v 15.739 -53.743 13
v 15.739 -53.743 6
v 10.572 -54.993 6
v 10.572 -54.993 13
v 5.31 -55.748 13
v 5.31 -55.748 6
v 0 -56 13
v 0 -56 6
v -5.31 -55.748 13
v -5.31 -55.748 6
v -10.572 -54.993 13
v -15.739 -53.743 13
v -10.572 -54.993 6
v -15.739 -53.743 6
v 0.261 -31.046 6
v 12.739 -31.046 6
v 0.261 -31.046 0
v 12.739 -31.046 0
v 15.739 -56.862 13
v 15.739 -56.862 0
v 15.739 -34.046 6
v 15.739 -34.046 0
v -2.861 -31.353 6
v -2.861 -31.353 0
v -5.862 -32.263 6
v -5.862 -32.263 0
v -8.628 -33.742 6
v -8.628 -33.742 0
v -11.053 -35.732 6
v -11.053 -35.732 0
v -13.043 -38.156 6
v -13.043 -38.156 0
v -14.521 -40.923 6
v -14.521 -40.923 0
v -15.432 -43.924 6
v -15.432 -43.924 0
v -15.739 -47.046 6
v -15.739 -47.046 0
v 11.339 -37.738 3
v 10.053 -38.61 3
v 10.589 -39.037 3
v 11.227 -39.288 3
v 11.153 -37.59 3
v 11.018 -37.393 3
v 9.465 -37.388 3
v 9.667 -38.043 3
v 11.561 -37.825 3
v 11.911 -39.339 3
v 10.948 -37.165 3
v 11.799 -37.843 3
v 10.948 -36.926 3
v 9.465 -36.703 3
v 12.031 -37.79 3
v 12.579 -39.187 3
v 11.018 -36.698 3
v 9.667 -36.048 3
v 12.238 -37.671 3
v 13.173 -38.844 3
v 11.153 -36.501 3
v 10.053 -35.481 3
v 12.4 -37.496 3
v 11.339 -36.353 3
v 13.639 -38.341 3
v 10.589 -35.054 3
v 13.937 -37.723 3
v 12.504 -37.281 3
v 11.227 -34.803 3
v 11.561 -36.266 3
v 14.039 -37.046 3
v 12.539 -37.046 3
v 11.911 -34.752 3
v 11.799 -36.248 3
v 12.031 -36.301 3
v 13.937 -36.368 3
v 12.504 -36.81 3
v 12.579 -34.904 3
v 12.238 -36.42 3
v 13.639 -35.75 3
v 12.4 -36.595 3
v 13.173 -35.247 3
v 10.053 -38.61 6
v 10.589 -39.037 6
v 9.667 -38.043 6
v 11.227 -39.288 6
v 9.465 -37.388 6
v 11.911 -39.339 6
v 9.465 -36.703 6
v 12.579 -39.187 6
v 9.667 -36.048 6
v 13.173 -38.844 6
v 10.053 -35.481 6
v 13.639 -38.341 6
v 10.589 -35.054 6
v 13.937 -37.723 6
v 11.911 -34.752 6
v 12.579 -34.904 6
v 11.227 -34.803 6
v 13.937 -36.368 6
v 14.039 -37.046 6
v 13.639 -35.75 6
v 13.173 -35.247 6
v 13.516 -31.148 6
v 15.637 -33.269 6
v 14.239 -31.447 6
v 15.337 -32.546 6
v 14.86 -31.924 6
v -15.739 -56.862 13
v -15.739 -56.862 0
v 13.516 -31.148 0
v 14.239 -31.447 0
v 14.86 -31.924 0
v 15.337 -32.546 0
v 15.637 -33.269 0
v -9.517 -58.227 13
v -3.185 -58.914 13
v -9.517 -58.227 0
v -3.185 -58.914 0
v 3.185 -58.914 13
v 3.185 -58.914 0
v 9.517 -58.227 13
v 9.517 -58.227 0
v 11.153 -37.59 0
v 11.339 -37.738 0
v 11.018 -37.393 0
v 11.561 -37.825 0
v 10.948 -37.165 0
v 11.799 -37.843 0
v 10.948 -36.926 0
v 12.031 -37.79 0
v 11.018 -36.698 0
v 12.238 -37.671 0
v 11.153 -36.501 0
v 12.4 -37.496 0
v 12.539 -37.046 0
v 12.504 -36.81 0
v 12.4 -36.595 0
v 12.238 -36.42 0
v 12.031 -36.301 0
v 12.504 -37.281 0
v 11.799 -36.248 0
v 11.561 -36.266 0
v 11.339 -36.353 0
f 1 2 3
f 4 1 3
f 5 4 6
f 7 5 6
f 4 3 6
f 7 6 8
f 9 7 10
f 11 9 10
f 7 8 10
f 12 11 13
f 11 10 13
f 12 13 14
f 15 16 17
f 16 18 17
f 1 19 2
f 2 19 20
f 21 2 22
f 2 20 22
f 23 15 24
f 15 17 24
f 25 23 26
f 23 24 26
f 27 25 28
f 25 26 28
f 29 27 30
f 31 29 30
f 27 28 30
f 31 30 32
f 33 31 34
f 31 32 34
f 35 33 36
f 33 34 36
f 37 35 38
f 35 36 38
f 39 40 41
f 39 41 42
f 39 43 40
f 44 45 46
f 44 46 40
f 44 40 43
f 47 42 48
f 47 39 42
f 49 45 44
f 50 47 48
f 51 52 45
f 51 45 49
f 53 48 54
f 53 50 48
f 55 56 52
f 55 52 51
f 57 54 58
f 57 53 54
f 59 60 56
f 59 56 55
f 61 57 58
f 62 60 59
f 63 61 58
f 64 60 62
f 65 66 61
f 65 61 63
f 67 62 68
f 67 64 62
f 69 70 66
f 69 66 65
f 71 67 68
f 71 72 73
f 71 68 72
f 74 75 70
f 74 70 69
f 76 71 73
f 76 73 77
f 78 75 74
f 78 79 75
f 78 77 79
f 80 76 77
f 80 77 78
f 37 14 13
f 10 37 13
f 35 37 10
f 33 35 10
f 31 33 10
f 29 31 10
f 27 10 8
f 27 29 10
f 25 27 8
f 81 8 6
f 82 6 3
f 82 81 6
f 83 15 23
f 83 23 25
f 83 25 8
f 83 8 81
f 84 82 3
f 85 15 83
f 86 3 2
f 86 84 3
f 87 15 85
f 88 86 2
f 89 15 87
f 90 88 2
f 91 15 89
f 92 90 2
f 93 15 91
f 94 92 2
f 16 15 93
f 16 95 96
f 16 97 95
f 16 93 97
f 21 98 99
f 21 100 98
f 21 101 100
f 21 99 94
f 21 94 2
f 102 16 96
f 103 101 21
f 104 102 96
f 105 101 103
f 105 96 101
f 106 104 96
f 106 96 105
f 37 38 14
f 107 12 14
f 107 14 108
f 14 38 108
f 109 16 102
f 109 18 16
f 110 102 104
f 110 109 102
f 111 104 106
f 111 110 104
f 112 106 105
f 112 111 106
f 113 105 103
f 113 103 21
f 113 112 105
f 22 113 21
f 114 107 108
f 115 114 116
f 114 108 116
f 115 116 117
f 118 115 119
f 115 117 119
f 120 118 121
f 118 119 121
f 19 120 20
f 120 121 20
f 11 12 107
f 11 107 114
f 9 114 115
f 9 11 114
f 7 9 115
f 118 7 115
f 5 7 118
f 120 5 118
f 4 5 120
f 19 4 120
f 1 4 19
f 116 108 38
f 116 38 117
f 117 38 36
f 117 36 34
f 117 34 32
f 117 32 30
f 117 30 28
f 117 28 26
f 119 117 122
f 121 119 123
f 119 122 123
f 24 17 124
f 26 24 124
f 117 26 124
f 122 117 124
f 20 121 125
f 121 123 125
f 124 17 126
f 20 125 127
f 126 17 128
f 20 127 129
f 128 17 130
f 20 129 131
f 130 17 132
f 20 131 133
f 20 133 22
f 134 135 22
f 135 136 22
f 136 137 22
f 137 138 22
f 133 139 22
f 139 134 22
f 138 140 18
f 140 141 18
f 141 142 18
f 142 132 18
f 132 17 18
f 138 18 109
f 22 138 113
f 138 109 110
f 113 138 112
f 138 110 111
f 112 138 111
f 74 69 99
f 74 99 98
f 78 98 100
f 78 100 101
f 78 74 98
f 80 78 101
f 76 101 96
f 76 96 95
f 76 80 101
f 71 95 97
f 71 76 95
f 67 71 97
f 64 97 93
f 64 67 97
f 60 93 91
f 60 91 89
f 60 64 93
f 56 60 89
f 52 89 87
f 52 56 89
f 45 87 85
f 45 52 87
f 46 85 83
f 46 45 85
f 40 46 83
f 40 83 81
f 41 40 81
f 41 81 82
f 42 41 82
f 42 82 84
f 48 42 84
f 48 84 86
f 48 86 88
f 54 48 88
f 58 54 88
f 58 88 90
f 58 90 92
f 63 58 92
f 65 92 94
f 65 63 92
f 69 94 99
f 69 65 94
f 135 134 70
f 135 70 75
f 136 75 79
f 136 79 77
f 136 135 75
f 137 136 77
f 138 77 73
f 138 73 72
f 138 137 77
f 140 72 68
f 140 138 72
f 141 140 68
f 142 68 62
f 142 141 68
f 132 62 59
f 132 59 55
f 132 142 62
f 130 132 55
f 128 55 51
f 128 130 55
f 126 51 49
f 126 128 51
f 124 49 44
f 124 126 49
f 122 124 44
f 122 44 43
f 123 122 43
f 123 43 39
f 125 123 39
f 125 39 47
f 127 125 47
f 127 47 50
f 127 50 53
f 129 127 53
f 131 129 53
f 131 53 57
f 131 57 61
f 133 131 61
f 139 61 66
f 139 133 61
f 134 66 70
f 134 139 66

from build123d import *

# Parameters (mm, degrees)
F0_R     = 0.8
F1_DEPTH = 3
F2_R     = 2.3
F3_DEPTH = 3
F5_DEPTH = 7
F6_R     = 16
F7_R     = 3


with BuildPart() as f1:
    # F0 (on Top) → F1 (new body)
    with BuildSketch(Plane.XY):
        with BuildLine():
            Line((15.7390861437, -56.8619483254), (15.7390861437, -31.0455008498))
            Line((15.7390861437, -31.0455008498), (-15.7390861437, -31.0455008498))
            Line((-15.7390861437, -31.0455008498), (-15.7390861437, -56.8619483254))
            ThreePointArc((-15.7390861437, -56.8619483254), (0, -59), (15.7390861437, -56.8619483254))
        make_face()
        with Locations((11.7390861437, -37.0455008498)):
            Circle(F0_R, mode=Mode.SUBTRACT)
    extrude(amount=F1_DEPTH)

    # F2 (on face) → F3 (join)
    with BuildSketch(Plane.XY.offset(3)):
        with BuildLine():
            Line((-15.7390861437, -31.0455008498), (-15.7390861437, -56.8619483254))
            ThreePointArc((-15.7390861437, -56.8619483254), (0, -59), (15.7390861437, -56.8619483254))
            Line((15.7390861437, -56.8619483254), (15.7390861437, -31.0455008498))
            Line((15.7390861437, -31.0455008498), (-15.7390861437, -31.0455008498))
        make_face()
        with Locations((11.7390861437, -37.0455008498)):
            Circle(F2_R, mode=Mode.SUBTRACT)
    extrude(amount=F3_DEPTH)

    # F4 (on face) → F5 (join)
    with BuildSketch(Plane.XY.offset(6)):
        with BuildLine():
            ThreePointArc((15.7390861437, -53.7427312979), (0, -56), (-15.7390861437, -53.7427312979))
            Line((-15.7390861437, -53.7427312979), (-15.7390861437, -56.8619483254))
            ThreePointArc((-15.7390861437, -56.8619483254), (0, -59), (15.7390861437, -56.8619483254))
            Line((15.7390861437, -56.8619483254), (15.7390861437, -53.7427312979))
        make_face()
    extrude(amount=F5_DEPTH)

    # F6
    f6_edges = [f1.edges().sort_by_distance(p)[0] for p in [
        (-15.739086, -31.045501, 3),
    ]]
    fillet(f6_edges, radius=F6_R)

    # F7
    f7_edges = [f1.edges().sort_by_distance(p)[0] for p in [
        (15.739086, -31.045501, 3),
    ]]
    fillet(f7_edges, radius=F7_R)


solid = f1.part
